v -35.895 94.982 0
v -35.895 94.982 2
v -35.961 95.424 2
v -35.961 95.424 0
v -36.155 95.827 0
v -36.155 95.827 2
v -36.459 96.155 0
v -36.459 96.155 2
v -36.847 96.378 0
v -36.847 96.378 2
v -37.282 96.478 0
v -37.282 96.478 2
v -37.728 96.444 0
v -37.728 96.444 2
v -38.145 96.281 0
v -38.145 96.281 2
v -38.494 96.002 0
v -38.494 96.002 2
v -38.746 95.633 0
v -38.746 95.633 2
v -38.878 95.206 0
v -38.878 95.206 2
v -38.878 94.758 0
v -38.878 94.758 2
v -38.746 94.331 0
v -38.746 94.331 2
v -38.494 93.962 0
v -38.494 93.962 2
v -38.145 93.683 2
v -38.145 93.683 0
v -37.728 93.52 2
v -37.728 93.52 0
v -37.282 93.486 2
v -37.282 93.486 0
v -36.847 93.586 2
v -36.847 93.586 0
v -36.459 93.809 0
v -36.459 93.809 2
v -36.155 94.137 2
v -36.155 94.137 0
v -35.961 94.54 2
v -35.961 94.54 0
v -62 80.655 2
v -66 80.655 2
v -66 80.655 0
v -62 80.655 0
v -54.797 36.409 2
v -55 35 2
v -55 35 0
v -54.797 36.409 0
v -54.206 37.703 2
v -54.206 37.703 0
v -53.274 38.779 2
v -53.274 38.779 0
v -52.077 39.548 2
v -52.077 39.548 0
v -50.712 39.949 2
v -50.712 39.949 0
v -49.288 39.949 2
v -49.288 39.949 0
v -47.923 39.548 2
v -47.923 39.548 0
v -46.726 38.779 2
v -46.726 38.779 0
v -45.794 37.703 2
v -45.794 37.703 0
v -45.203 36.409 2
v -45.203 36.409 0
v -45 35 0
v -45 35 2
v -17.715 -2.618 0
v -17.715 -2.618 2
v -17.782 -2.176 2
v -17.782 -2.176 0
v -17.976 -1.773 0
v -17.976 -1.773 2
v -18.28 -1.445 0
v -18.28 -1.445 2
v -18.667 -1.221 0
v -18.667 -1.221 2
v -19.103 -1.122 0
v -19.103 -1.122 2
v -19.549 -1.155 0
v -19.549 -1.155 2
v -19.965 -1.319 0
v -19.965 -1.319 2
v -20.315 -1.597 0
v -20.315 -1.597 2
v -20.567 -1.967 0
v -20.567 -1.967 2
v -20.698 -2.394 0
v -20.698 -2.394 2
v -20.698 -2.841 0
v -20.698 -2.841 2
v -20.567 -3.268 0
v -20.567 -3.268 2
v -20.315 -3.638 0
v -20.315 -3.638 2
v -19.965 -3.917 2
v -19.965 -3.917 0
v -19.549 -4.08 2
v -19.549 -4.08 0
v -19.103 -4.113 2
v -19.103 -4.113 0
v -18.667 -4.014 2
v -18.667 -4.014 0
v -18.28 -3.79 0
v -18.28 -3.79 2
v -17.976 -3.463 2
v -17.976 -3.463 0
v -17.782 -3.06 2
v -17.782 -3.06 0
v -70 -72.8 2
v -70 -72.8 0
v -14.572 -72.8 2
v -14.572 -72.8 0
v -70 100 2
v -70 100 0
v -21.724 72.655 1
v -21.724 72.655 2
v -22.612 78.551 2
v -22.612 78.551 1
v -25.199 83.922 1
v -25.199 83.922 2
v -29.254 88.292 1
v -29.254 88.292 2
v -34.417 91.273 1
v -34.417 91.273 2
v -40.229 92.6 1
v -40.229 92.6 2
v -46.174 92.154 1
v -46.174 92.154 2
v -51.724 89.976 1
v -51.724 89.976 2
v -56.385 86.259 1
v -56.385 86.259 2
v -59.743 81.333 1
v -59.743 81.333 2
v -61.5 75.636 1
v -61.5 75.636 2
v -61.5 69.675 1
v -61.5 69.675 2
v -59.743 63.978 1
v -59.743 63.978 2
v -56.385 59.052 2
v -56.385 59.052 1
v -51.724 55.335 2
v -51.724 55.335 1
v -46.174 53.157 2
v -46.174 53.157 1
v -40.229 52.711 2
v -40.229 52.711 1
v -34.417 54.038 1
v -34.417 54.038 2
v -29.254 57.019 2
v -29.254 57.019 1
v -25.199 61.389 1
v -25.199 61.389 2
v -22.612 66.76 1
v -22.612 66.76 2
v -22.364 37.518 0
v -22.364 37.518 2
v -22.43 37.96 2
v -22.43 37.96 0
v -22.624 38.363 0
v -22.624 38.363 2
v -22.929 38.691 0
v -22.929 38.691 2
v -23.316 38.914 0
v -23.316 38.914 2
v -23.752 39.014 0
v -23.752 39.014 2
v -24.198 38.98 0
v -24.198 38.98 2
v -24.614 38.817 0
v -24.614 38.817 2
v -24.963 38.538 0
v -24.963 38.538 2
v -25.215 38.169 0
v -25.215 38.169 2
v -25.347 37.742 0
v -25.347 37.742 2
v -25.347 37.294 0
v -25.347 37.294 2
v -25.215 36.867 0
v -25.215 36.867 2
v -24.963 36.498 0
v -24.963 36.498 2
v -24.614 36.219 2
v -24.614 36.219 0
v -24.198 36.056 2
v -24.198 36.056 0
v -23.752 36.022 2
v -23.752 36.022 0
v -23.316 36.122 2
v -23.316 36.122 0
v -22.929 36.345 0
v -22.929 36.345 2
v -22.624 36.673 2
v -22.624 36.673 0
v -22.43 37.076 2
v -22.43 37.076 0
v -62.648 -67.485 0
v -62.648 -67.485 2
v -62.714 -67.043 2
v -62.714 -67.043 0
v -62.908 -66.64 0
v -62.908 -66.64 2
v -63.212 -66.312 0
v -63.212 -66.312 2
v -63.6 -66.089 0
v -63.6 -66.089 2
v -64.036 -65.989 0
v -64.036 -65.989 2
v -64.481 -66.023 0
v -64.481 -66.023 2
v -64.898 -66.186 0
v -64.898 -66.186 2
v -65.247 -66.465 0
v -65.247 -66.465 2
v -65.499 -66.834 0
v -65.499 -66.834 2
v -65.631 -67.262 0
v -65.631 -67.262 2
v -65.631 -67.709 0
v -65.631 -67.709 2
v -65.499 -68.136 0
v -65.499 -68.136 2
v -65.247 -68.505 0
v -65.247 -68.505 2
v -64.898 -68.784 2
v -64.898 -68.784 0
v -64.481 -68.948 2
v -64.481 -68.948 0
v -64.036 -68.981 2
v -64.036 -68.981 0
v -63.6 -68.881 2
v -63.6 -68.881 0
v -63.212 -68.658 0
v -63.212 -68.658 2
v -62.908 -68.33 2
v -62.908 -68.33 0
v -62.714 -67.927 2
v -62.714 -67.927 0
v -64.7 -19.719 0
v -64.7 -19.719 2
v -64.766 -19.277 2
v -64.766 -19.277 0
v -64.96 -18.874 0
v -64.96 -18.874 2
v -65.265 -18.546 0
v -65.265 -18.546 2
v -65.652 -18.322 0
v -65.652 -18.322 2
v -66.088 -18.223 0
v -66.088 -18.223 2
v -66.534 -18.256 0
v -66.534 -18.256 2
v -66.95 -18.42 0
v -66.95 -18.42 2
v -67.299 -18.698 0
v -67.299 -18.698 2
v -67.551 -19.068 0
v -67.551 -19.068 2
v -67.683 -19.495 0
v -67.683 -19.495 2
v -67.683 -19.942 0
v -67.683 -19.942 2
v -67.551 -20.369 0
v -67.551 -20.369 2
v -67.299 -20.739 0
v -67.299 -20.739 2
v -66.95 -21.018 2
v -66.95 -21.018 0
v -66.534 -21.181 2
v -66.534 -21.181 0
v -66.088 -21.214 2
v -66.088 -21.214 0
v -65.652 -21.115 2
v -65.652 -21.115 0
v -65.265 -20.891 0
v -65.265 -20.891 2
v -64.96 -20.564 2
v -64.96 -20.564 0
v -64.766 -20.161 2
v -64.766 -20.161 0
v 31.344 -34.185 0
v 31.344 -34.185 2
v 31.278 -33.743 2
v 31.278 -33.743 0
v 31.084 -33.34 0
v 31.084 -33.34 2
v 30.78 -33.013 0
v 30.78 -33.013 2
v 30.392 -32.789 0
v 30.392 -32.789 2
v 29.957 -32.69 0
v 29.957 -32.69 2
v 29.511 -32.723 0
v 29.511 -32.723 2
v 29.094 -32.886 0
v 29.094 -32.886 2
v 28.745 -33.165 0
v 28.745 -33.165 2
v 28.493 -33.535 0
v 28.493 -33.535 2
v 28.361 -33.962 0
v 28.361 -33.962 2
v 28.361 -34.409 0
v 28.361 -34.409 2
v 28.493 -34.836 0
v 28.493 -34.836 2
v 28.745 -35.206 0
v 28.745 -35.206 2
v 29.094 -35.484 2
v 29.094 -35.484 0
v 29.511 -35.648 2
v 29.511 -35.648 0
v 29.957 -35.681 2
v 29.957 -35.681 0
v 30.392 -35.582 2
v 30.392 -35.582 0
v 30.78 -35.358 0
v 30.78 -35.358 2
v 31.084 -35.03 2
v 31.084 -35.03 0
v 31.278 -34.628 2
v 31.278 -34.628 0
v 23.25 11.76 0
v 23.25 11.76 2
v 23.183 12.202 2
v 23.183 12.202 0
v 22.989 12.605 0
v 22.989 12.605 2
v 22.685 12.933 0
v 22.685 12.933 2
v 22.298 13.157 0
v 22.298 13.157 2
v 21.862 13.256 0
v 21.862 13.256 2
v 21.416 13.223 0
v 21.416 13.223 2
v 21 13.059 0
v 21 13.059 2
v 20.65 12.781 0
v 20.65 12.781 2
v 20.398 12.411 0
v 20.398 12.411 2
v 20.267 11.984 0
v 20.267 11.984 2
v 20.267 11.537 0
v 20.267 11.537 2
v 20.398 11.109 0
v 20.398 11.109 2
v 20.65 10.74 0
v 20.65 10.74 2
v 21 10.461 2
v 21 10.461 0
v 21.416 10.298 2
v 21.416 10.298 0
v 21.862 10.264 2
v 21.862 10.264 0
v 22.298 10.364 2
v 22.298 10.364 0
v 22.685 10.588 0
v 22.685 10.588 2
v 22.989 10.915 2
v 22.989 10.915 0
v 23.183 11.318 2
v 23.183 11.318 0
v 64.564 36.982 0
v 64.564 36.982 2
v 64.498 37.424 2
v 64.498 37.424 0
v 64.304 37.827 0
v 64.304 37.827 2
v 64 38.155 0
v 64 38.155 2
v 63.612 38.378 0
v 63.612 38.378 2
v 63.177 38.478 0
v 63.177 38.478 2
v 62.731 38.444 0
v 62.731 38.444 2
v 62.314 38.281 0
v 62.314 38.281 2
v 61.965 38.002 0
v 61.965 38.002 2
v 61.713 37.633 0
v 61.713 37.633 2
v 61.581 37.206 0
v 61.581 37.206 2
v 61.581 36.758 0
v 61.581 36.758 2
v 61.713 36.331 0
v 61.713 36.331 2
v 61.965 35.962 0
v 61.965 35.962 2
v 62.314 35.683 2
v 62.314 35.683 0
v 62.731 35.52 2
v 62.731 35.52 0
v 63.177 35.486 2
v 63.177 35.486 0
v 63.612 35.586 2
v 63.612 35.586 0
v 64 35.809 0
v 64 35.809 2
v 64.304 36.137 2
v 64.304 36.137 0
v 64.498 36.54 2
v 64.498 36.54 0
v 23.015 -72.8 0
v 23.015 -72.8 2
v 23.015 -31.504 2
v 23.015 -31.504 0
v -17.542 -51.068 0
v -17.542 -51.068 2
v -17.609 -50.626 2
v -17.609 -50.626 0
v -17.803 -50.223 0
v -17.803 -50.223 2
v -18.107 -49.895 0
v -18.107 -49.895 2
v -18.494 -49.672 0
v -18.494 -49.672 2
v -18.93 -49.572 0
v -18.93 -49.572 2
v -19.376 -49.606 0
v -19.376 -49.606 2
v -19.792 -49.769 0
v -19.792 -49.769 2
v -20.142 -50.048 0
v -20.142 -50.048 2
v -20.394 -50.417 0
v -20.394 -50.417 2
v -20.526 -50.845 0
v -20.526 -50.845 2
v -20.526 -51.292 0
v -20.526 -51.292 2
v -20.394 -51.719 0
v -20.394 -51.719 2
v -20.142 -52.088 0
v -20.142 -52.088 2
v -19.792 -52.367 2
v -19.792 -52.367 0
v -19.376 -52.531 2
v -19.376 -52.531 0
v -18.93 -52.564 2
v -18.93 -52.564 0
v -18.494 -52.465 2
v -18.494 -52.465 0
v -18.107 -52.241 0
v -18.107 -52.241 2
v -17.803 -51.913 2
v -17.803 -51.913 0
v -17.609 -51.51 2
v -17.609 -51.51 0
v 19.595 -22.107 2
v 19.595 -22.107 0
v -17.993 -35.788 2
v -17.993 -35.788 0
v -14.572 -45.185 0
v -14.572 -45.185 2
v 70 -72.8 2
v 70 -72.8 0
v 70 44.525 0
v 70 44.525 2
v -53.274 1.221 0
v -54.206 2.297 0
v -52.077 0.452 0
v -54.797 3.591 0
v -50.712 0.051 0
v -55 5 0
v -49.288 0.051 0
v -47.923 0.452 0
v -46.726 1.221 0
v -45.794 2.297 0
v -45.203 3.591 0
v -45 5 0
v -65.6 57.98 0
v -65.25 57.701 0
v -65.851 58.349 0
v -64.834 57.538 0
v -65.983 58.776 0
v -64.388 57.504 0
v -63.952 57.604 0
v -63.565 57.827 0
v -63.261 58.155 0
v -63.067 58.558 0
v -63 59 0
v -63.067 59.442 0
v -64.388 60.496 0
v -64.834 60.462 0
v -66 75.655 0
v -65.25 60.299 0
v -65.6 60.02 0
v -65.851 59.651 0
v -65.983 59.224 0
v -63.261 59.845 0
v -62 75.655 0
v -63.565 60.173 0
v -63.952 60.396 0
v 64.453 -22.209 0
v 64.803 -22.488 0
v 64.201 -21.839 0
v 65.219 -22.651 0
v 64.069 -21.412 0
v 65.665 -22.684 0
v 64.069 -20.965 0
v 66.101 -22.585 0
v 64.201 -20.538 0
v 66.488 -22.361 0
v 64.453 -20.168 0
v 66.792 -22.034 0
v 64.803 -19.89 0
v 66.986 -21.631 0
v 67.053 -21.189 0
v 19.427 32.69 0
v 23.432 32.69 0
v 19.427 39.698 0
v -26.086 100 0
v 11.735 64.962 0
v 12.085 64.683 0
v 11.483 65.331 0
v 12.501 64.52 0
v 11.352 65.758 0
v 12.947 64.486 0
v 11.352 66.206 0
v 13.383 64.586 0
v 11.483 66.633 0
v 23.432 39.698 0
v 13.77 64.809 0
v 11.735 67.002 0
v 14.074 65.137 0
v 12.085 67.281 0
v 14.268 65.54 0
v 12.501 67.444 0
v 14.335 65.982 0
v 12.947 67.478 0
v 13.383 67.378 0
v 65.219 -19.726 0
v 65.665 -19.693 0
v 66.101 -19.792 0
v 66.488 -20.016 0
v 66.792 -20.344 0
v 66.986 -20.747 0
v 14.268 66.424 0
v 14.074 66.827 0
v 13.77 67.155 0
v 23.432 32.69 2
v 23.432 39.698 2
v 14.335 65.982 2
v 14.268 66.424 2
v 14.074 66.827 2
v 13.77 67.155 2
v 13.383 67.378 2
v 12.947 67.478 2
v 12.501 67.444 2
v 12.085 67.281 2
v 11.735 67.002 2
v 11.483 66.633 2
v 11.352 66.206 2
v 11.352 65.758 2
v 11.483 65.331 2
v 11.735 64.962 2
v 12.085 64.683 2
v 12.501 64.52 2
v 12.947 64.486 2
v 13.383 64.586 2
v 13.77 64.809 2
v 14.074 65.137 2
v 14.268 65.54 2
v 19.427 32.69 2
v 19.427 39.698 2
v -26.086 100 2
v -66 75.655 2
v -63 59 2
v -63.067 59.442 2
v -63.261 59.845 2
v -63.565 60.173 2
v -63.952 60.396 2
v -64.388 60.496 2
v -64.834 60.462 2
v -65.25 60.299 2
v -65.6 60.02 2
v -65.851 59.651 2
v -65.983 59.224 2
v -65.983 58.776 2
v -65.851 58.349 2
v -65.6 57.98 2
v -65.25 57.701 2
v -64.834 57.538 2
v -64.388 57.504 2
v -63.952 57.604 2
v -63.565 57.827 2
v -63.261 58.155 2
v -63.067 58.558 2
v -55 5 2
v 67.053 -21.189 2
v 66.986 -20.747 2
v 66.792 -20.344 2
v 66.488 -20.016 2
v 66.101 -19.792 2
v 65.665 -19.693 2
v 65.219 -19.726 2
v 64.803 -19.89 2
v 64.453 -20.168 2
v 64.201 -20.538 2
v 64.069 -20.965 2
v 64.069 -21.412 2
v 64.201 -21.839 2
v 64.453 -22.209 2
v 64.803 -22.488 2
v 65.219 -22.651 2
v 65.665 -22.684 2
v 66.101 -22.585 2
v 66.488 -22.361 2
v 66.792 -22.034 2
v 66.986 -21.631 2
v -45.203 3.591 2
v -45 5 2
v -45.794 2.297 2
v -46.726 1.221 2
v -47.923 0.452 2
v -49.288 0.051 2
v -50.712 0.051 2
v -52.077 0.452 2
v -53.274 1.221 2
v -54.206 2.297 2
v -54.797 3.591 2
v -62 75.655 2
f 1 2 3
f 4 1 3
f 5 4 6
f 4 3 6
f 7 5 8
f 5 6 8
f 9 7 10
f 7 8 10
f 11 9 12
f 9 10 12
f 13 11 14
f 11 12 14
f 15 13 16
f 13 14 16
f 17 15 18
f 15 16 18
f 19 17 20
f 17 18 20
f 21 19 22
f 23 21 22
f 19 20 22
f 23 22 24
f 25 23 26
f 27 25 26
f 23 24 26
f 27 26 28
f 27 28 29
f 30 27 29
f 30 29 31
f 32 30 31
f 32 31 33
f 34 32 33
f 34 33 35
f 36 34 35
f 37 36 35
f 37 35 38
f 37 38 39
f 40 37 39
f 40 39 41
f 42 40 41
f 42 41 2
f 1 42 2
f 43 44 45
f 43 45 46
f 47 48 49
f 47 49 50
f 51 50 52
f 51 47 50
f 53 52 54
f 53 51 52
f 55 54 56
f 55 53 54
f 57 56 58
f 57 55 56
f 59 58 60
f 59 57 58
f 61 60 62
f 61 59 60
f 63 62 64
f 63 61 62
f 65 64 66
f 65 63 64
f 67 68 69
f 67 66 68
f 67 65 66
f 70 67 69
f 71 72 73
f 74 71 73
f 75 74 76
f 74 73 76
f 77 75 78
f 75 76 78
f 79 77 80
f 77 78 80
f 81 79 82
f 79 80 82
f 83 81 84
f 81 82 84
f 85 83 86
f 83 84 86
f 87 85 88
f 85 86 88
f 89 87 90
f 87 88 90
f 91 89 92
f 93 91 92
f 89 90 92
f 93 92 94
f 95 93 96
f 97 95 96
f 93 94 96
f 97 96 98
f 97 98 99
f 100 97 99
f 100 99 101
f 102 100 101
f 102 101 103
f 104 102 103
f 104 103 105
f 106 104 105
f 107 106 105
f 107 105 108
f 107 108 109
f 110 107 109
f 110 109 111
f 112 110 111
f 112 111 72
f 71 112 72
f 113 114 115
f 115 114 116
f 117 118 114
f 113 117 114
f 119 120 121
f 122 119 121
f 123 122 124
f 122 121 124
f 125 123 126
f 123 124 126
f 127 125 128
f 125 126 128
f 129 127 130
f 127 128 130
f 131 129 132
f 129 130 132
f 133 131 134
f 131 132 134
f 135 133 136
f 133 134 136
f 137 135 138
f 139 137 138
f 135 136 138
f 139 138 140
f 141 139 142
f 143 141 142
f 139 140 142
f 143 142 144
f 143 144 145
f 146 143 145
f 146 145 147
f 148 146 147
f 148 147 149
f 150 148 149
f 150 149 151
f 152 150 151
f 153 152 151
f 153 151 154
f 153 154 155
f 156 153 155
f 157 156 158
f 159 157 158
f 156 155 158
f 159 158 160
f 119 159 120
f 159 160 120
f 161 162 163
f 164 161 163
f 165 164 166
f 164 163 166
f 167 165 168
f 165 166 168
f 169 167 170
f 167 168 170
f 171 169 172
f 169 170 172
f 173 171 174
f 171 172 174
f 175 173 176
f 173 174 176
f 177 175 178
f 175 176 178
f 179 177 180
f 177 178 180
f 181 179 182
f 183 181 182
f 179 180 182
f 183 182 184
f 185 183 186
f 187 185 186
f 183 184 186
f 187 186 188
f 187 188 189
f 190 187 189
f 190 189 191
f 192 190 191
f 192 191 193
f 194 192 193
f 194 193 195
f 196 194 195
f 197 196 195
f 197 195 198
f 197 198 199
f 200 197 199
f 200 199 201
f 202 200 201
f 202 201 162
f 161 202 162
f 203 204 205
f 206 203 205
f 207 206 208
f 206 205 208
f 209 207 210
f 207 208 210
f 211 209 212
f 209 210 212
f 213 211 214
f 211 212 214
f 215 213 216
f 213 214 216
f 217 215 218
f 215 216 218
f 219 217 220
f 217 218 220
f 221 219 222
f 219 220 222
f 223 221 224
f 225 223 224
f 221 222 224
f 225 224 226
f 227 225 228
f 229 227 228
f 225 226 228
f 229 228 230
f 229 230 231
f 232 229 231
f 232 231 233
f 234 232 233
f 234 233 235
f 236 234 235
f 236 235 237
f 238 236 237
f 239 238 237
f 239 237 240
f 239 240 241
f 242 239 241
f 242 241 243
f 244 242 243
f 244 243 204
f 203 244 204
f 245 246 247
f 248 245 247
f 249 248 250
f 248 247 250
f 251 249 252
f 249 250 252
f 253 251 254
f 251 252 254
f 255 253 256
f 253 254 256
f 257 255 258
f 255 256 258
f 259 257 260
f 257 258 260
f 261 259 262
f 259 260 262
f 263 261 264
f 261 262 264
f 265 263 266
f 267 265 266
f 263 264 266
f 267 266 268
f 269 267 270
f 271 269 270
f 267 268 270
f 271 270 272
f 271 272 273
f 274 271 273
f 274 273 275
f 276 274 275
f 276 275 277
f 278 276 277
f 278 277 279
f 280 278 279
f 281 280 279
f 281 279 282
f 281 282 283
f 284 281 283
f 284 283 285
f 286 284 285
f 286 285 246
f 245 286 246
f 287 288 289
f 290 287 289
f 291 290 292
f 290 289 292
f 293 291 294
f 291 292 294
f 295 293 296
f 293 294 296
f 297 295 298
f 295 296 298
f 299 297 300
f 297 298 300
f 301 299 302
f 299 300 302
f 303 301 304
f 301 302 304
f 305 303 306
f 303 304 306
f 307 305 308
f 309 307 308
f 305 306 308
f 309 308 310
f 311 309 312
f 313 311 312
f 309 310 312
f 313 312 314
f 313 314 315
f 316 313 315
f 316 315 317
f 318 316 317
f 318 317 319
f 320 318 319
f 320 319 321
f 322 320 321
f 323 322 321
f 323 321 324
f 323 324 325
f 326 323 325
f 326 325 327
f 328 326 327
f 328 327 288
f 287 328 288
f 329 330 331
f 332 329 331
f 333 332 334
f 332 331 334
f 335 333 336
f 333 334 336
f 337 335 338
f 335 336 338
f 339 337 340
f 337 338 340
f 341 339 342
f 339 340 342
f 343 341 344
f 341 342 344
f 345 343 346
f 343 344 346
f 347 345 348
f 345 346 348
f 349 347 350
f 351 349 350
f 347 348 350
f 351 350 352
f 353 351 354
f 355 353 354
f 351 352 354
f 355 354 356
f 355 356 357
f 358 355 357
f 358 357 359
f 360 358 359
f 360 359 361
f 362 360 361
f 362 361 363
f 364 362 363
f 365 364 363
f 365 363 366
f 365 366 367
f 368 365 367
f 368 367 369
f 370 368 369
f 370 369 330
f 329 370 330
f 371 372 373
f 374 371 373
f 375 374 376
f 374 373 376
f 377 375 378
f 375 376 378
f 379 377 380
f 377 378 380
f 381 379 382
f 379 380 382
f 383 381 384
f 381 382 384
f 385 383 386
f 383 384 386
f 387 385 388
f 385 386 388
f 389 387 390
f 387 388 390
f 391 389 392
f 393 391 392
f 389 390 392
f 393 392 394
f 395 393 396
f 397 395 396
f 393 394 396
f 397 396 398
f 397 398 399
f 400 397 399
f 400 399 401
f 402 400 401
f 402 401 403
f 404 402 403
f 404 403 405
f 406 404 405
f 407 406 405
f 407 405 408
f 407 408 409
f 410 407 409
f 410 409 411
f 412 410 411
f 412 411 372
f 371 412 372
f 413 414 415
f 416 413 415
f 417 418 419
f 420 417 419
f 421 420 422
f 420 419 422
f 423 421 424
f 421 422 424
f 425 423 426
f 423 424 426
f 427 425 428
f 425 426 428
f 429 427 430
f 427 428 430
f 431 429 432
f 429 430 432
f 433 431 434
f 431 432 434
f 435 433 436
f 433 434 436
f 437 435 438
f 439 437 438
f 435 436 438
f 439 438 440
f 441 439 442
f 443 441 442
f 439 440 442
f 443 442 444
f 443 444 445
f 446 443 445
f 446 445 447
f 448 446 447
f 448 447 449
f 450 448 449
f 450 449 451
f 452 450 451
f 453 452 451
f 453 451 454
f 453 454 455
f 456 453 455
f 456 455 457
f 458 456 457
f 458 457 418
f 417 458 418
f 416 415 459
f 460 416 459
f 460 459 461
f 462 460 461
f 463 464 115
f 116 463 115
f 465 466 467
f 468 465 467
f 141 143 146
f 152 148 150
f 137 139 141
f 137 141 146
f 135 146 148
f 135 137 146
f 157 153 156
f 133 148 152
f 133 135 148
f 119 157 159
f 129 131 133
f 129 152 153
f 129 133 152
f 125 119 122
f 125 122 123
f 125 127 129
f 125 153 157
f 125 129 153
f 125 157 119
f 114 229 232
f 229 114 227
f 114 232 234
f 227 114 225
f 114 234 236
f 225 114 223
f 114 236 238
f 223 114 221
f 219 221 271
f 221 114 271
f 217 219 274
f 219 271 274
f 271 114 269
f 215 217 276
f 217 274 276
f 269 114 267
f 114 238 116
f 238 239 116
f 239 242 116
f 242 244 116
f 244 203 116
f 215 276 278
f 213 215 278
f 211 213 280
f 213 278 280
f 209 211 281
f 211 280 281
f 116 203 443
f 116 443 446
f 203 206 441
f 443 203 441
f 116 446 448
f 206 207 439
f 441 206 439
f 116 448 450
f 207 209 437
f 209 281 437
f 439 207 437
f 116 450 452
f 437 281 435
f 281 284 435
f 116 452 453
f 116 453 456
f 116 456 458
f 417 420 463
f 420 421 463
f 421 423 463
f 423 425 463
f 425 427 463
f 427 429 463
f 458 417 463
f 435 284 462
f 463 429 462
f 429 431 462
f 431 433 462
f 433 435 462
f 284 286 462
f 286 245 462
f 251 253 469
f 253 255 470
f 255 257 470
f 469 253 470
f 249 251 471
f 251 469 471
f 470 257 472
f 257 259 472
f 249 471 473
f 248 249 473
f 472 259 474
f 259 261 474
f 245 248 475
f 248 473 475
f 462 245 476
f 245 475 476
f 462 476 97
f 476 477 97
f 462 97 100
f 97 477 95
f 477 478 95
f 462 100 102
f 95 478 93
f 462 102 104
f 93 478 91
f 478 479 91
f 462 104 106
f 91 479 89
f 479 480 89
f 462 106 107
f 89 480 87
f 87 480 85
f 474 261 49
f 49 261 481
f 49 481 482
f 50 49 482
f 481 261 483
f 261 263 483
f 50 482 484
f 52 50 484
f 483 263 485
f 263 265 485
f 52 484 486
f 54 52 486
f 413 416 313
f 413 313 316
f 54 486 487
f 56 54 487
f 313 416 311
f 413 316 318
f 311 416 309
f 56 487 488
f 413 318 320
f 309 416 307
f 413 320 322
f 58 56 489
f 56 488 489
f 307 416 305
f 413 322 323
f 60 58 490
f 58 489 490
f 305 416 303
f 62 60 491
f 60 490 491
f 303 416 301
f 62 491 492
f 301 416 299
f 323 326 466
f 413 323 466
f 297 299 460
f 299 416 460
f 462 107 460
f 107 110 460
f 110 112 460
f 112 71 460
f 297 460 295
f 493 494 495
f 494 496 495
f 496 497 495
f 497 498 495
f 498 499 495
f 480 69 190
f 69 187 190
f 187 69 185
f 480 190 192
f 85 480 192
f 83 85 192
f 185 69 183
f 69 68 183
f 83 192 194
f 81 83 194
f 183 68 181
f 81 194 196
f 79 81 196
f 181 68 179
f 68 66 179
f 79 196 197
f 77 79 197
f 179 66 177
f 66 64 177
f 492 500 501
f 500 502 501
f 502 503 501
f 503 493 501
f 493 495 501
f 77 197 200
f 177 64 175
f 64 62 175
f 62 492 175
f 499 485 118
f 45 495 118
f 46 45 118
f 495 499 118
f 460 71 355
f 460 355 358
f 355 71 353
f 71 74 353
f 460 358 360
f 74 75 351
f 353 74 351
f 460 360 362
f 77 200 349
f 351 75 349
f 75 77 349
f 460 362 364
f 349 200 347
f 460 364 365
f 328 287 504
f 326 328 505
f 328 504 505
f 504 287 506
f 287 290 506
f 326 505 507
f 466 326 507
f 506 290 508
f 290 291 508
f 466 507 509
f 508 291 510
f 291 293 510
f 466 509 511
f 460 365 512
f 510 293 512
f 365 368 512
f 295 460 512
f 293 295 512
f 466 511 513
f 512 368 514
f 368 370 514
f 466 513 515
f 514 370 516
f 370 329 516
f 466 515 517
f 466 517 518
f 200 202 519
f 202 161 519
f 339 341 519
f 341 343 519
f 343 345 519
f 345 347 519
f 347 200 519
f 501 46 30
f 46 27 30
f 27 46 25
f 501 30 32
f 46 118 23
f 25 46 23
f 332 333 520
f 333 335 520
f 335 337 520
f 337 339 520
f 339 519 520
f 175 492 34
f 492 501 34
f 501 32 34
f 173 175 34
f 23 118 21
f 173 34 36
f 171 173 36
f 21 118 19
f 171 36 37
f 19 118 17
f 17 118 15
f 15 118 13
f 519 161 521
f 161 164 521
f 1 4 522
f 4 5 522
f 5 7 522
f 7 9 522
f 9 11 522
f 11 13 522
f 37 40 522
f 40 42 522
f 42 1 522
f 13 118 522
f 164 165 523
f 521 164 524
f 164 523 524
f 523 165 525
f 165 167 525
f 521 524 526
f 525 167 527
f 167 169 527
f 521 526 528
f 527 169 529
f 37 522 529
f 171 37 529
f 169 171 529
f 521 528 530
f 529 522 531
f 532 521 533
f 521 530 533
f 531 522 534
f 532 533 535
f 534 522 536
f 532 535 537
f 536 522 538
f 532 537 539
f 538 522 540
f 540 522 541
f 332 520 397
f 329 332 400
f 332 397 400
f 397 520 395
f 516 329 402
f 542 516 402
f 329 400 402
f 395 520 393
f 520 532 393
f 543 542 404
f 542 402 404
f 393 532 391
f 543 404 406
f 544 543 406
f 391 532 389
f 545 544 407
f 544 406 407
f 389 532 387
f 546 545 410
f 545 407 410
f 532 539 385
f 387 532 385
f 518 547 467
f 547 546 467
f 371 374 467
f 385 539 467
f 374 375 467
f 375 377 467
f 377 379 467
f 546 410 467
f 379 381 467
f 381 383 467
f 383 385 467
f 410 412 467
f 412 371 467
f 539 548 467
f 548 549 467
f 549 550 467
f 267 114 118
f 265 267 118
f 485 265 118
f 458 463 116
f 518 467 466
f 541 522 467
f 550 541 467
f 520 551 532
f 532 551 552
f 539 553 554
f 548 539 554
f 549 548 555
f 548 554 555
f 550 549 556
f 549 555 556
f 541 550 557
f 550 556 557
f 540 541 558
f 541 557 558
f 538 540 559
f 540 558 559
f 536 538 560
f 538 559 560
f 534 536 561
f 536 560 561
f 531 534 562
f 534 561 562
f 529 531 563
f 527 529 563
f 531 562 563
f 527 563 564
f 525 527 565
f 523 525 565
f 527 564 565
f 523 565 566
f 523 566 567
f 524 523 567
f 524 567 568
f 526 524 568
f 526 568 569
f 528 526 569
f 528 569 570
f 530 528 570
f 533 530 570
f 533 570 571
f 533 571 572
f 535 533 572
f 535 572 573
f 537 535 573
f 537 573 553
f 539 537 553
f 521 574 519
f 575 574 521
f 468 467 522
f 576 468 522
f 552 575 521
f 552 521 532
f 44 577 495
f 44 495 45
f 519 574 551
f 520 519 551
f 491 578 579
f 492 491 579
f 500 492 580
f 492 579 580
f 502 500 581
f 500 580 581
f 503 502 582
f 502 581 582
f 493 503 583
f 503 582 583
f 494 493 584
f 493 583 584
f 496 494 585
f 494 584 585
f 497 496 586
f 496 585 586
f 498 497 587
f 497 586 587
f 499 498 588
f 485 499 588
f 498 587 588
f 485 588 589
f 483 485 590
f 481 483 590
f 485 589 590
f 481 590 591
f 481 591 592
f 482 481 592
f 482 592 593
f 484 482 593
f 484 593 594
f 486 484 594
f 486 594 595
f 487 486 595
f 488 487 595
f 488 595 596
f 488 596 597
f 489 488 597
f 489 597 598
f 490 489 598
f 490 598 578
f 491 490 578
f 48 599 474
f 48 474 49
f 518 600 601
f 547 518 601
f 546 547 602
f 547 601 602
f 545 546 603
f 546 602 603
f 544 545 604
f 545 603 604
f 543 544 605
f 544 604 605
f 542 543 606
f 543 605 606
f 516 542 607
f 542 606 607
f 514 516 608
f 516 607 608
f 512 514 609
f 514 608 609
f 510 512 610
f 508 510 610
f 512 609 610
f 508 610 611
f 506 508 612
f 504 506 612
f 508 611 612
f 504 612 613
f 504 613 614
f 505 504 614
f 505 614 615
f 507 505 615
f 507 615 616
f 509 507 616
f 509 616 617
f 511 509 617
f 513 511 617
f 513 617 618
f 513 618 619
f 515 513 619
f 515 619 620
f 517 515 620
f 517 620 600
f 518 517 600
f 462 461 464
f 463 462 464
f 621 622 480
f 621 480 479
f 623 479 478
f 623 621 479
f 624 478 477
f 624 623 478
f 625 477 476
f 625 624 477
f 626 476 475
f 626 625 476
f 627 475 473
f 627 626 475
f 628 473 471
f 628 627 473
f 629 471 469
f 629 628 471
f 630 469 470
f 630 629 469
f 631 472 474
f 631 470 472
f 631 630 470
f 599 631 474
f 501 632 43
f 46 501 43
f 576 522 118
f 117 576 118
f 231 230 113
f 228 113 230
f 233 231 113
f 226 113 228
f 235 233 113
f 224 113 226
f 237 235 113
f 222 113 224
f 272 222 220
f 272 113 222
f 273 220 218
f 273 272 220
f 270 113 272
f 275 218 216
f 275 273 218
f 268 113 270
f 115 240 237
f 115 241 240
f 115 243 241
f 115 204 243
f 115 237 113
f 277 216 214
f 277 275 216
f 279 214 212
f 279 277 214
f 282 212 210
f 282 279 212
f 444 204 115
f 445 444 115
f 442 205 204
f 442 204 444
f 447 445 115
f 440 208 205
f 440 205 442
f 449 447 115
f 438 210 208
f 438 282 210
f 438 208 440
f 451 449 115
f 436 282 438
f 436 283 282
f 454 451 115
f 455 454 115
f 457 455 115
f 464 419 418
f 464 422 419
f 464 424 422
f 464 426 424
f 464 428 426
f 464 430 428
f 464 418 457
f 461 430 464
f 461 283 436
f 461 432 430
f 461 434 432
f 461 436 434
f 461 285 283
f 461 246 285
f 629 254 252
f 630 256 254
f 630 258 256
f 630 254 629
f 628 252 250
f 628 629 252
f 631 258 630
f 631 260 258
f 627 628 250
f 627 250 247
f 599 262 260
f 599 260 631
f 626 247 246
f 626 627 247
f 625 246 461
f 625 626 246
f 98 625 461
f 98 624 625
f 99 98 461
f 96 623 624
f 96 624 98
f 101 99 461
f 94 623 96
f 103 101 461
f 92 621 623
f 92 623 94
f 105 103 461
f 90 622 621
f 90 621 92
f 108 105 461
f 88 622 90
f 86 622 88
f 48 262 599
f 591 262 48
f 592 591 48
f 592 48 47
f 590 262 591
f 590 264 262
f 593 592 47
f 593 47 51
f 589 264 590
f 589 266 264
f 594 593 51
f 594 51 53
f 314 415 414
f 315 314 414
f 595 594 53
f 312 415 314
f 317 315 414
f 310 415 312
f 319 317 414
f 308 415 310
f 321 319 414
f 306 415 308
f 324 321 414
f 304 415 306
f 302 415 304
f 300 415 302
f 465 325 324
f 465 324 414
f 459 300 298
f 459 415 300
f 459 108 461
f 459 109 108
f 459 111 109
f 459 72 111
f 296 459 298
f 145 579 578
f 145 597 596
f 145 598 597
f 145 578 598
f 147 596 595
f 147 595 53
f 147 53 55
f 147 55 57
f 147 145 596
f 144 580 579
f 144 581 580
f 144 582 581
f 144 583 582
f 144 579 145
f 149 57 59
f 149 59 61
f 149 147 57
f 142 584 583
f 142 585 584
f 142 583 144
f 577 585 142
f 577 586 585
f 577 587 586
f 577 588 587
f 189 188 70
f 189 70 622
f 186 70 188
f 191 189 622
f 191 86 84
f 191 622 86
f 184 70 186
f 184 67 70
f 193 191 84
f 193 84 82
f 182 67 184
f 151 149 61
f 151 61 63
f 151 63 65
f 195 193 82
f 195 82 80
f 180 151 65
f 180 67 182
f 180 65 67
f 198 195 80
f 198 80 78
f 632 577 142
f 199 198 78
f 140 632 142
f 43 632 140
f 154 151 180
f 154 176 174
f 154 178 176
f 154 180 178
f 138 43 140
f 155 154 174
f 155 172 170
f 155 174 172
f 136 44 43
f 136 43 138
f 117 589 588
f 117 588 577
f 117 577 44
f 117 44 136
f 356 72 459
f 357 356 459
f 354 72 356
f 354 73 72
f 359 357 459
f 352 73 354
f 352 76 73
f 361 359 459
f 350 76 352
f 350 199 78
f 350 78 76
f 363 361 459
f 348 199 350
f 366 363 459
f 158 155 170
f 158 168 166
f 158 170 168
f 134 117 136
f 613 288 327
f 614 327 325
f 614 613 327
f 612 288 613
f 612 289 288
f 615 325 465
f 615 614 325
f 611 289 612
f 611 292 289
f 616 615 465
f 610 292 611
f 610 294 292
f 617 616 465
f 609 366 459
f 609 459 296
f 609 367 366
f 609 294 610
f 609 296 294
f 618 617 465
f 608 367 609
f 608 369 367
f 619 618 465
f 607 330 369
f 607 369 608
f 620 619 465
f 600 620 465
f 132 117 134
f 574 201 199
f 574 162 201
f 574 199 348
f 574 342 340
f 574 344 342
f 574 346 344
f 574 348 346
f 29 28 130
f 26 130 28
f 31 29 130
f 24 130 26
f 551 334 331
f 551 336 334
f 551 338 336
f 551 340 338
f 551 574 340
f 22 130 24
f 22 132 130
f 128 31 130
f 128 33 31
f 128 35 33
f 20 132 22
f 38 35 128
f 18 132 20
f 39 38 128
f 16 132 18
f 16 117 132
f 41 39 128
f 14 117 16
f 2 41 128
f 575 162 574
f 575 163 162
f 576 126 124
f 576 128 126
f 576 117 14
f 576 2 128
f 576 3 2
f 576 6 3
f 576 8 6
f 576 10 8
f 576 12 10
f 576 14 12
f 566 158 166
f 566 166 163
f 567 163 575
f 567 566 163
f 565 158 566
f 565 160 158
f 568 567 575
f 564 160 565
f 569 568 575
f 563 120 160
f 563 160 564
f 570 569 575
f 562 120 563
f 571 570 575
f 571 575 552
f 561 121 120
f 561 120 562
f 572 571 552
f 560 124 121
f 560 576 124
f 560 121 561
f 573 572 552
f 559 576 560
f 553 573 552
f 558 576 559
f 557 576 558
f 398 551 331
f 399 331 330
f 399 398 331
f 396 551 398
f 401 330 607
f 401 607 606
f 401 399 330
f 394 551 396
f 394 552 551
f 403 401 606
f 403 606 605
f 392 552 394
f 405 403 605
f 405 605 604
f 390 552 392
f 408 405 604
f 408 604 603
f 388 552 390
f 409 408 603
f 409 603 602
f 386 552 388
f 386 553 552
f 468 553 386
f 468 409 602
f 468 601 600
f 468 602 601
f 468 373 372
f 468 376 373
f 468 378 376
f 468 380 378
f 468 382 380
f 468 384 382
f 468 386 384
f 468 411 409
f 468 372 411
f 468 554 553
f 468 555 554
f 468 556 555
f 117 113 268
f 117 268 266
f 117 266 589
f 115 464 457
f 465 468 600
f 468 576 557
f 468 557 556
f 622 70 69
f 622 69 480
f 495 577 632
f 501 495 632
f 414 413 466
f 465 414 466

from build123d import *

# Parameters (mm, degrees)
BOSS_EXTRUDE1_DEPTH         = 2
SKETCH3_W                   = 4.004504799
SKETCH3_H                   = 7.007808652
SKETCH3_W_2                 = 4
SKETCH3_H_2                 = 5
CUT_EXTRUDE1_DEPTH          = 10
SKETCH4_R                   = 20
CUT_EXTRUDE2_DEPTH          = 1
F_3_0MM_PRESS_DOWEL_HOLE1_D = 3
CUT_EXTRUDE3_DEPTH          = 272.480461976


with BuildPart() as part:
    # Sketch1 → Boss-Extrude1 (new body)
    with BuildSketch(Plane.XY):
        Polygon((-70, 100), (-70, -72.799540117), (70, -72.799540117), (70, 44.524791386), (-26.08587988, 100), align=None)
    extrude(amount=BOSS_EXTRUDE1_DEPTH)

    # Sketch3 → Cut-Extrude1 (cut)
    with BuildSketch(Plane.XY.offset(2)):
        with Locations((21.429491924, 36.193920339)):
            Rectangle(SKETCH3_W, SKETCH3_H)
        with Locations((-64, 78.155444566)):
            Rectangle(SKETCH3_W_2, SKETCH3_H_2)
        Polygon((-14.572335871, -75.184527756), (23.015368961, -75.184527756), (23.015368961, -31.503722023), (19.595167527, -22.106795815), (-17.992537304, -35.787601548), (-14.572335871, -45.184527756), align=None)
    extrude(amount=-CUT_EXTRUDE1_DEPTH, mode=Mode.SUBTRACT)

    # Sketch4 → Cut-Extrude2 (cut)
    with BuildSketch(Plane.XY.offset(2)):
        with Locations((-41.723720558, 72.655444566)):
            Circle(SKETCH4_R)
    extrude(amount=-CUT_EXTRUDE2_DEPTH, mode=Mode.SUBTRACT)

    # Ø3.0mm Press Dowel Hole1 (through all)
    with Locations(Plane(origin=(-89.742029537, -119.499715795, 0), x_dir=(-1, 0, 0), z_dir=(0, 0, -1))):
        with Locations((-23.542258378, 99.781049413), (-25.594379238, 52.014538143), (-70.699625036, 68.431505023), (-70.526889417, 116.882056579), (-111.491838386, 131.259989766), (-119.586439667, 85.314281565), (-155.294759257, 98.311047011), (-152.806439447, 156.481766603), (-65.878236217, 157.017664987), (-102.576966028, 185.481766603), (-52.347492608, 214.481766603), (-25.242029537, 178.499715795)):
            Hole(F_3_0MM_PRESS_DOWEL_HOLE1_D / 2)

    # Sketch7 → Cut-Extrude3 (cut, through all)
    with BuildSketch(Plane(origin=(-89.742029537, -119.499715795, 2), x_dir=(1, 0, 0), z_dir=(0, 0, 1))):
        with BuildLine():
            Line((44.742029537, 154.499715795), (44.742029537, 124.499715795))
            ThreePointArc((44.742029537, 124.499715795), (39.742029537, 119.499715795), (34.742029537, 124.499715795))
            Line((34.742029537, 124.499715795), (34.742029537, 154.499715795))
            ThreePointArc((34.742029537, 154.499715795), (39.742029537, 159.499715795), (44.742029537, 154.499715795))
        make_face()
    extrude(amount=-CUT_EXTRUDE3_DEPTH, mode=Mode.SUBTRACT)


solid = part.part
